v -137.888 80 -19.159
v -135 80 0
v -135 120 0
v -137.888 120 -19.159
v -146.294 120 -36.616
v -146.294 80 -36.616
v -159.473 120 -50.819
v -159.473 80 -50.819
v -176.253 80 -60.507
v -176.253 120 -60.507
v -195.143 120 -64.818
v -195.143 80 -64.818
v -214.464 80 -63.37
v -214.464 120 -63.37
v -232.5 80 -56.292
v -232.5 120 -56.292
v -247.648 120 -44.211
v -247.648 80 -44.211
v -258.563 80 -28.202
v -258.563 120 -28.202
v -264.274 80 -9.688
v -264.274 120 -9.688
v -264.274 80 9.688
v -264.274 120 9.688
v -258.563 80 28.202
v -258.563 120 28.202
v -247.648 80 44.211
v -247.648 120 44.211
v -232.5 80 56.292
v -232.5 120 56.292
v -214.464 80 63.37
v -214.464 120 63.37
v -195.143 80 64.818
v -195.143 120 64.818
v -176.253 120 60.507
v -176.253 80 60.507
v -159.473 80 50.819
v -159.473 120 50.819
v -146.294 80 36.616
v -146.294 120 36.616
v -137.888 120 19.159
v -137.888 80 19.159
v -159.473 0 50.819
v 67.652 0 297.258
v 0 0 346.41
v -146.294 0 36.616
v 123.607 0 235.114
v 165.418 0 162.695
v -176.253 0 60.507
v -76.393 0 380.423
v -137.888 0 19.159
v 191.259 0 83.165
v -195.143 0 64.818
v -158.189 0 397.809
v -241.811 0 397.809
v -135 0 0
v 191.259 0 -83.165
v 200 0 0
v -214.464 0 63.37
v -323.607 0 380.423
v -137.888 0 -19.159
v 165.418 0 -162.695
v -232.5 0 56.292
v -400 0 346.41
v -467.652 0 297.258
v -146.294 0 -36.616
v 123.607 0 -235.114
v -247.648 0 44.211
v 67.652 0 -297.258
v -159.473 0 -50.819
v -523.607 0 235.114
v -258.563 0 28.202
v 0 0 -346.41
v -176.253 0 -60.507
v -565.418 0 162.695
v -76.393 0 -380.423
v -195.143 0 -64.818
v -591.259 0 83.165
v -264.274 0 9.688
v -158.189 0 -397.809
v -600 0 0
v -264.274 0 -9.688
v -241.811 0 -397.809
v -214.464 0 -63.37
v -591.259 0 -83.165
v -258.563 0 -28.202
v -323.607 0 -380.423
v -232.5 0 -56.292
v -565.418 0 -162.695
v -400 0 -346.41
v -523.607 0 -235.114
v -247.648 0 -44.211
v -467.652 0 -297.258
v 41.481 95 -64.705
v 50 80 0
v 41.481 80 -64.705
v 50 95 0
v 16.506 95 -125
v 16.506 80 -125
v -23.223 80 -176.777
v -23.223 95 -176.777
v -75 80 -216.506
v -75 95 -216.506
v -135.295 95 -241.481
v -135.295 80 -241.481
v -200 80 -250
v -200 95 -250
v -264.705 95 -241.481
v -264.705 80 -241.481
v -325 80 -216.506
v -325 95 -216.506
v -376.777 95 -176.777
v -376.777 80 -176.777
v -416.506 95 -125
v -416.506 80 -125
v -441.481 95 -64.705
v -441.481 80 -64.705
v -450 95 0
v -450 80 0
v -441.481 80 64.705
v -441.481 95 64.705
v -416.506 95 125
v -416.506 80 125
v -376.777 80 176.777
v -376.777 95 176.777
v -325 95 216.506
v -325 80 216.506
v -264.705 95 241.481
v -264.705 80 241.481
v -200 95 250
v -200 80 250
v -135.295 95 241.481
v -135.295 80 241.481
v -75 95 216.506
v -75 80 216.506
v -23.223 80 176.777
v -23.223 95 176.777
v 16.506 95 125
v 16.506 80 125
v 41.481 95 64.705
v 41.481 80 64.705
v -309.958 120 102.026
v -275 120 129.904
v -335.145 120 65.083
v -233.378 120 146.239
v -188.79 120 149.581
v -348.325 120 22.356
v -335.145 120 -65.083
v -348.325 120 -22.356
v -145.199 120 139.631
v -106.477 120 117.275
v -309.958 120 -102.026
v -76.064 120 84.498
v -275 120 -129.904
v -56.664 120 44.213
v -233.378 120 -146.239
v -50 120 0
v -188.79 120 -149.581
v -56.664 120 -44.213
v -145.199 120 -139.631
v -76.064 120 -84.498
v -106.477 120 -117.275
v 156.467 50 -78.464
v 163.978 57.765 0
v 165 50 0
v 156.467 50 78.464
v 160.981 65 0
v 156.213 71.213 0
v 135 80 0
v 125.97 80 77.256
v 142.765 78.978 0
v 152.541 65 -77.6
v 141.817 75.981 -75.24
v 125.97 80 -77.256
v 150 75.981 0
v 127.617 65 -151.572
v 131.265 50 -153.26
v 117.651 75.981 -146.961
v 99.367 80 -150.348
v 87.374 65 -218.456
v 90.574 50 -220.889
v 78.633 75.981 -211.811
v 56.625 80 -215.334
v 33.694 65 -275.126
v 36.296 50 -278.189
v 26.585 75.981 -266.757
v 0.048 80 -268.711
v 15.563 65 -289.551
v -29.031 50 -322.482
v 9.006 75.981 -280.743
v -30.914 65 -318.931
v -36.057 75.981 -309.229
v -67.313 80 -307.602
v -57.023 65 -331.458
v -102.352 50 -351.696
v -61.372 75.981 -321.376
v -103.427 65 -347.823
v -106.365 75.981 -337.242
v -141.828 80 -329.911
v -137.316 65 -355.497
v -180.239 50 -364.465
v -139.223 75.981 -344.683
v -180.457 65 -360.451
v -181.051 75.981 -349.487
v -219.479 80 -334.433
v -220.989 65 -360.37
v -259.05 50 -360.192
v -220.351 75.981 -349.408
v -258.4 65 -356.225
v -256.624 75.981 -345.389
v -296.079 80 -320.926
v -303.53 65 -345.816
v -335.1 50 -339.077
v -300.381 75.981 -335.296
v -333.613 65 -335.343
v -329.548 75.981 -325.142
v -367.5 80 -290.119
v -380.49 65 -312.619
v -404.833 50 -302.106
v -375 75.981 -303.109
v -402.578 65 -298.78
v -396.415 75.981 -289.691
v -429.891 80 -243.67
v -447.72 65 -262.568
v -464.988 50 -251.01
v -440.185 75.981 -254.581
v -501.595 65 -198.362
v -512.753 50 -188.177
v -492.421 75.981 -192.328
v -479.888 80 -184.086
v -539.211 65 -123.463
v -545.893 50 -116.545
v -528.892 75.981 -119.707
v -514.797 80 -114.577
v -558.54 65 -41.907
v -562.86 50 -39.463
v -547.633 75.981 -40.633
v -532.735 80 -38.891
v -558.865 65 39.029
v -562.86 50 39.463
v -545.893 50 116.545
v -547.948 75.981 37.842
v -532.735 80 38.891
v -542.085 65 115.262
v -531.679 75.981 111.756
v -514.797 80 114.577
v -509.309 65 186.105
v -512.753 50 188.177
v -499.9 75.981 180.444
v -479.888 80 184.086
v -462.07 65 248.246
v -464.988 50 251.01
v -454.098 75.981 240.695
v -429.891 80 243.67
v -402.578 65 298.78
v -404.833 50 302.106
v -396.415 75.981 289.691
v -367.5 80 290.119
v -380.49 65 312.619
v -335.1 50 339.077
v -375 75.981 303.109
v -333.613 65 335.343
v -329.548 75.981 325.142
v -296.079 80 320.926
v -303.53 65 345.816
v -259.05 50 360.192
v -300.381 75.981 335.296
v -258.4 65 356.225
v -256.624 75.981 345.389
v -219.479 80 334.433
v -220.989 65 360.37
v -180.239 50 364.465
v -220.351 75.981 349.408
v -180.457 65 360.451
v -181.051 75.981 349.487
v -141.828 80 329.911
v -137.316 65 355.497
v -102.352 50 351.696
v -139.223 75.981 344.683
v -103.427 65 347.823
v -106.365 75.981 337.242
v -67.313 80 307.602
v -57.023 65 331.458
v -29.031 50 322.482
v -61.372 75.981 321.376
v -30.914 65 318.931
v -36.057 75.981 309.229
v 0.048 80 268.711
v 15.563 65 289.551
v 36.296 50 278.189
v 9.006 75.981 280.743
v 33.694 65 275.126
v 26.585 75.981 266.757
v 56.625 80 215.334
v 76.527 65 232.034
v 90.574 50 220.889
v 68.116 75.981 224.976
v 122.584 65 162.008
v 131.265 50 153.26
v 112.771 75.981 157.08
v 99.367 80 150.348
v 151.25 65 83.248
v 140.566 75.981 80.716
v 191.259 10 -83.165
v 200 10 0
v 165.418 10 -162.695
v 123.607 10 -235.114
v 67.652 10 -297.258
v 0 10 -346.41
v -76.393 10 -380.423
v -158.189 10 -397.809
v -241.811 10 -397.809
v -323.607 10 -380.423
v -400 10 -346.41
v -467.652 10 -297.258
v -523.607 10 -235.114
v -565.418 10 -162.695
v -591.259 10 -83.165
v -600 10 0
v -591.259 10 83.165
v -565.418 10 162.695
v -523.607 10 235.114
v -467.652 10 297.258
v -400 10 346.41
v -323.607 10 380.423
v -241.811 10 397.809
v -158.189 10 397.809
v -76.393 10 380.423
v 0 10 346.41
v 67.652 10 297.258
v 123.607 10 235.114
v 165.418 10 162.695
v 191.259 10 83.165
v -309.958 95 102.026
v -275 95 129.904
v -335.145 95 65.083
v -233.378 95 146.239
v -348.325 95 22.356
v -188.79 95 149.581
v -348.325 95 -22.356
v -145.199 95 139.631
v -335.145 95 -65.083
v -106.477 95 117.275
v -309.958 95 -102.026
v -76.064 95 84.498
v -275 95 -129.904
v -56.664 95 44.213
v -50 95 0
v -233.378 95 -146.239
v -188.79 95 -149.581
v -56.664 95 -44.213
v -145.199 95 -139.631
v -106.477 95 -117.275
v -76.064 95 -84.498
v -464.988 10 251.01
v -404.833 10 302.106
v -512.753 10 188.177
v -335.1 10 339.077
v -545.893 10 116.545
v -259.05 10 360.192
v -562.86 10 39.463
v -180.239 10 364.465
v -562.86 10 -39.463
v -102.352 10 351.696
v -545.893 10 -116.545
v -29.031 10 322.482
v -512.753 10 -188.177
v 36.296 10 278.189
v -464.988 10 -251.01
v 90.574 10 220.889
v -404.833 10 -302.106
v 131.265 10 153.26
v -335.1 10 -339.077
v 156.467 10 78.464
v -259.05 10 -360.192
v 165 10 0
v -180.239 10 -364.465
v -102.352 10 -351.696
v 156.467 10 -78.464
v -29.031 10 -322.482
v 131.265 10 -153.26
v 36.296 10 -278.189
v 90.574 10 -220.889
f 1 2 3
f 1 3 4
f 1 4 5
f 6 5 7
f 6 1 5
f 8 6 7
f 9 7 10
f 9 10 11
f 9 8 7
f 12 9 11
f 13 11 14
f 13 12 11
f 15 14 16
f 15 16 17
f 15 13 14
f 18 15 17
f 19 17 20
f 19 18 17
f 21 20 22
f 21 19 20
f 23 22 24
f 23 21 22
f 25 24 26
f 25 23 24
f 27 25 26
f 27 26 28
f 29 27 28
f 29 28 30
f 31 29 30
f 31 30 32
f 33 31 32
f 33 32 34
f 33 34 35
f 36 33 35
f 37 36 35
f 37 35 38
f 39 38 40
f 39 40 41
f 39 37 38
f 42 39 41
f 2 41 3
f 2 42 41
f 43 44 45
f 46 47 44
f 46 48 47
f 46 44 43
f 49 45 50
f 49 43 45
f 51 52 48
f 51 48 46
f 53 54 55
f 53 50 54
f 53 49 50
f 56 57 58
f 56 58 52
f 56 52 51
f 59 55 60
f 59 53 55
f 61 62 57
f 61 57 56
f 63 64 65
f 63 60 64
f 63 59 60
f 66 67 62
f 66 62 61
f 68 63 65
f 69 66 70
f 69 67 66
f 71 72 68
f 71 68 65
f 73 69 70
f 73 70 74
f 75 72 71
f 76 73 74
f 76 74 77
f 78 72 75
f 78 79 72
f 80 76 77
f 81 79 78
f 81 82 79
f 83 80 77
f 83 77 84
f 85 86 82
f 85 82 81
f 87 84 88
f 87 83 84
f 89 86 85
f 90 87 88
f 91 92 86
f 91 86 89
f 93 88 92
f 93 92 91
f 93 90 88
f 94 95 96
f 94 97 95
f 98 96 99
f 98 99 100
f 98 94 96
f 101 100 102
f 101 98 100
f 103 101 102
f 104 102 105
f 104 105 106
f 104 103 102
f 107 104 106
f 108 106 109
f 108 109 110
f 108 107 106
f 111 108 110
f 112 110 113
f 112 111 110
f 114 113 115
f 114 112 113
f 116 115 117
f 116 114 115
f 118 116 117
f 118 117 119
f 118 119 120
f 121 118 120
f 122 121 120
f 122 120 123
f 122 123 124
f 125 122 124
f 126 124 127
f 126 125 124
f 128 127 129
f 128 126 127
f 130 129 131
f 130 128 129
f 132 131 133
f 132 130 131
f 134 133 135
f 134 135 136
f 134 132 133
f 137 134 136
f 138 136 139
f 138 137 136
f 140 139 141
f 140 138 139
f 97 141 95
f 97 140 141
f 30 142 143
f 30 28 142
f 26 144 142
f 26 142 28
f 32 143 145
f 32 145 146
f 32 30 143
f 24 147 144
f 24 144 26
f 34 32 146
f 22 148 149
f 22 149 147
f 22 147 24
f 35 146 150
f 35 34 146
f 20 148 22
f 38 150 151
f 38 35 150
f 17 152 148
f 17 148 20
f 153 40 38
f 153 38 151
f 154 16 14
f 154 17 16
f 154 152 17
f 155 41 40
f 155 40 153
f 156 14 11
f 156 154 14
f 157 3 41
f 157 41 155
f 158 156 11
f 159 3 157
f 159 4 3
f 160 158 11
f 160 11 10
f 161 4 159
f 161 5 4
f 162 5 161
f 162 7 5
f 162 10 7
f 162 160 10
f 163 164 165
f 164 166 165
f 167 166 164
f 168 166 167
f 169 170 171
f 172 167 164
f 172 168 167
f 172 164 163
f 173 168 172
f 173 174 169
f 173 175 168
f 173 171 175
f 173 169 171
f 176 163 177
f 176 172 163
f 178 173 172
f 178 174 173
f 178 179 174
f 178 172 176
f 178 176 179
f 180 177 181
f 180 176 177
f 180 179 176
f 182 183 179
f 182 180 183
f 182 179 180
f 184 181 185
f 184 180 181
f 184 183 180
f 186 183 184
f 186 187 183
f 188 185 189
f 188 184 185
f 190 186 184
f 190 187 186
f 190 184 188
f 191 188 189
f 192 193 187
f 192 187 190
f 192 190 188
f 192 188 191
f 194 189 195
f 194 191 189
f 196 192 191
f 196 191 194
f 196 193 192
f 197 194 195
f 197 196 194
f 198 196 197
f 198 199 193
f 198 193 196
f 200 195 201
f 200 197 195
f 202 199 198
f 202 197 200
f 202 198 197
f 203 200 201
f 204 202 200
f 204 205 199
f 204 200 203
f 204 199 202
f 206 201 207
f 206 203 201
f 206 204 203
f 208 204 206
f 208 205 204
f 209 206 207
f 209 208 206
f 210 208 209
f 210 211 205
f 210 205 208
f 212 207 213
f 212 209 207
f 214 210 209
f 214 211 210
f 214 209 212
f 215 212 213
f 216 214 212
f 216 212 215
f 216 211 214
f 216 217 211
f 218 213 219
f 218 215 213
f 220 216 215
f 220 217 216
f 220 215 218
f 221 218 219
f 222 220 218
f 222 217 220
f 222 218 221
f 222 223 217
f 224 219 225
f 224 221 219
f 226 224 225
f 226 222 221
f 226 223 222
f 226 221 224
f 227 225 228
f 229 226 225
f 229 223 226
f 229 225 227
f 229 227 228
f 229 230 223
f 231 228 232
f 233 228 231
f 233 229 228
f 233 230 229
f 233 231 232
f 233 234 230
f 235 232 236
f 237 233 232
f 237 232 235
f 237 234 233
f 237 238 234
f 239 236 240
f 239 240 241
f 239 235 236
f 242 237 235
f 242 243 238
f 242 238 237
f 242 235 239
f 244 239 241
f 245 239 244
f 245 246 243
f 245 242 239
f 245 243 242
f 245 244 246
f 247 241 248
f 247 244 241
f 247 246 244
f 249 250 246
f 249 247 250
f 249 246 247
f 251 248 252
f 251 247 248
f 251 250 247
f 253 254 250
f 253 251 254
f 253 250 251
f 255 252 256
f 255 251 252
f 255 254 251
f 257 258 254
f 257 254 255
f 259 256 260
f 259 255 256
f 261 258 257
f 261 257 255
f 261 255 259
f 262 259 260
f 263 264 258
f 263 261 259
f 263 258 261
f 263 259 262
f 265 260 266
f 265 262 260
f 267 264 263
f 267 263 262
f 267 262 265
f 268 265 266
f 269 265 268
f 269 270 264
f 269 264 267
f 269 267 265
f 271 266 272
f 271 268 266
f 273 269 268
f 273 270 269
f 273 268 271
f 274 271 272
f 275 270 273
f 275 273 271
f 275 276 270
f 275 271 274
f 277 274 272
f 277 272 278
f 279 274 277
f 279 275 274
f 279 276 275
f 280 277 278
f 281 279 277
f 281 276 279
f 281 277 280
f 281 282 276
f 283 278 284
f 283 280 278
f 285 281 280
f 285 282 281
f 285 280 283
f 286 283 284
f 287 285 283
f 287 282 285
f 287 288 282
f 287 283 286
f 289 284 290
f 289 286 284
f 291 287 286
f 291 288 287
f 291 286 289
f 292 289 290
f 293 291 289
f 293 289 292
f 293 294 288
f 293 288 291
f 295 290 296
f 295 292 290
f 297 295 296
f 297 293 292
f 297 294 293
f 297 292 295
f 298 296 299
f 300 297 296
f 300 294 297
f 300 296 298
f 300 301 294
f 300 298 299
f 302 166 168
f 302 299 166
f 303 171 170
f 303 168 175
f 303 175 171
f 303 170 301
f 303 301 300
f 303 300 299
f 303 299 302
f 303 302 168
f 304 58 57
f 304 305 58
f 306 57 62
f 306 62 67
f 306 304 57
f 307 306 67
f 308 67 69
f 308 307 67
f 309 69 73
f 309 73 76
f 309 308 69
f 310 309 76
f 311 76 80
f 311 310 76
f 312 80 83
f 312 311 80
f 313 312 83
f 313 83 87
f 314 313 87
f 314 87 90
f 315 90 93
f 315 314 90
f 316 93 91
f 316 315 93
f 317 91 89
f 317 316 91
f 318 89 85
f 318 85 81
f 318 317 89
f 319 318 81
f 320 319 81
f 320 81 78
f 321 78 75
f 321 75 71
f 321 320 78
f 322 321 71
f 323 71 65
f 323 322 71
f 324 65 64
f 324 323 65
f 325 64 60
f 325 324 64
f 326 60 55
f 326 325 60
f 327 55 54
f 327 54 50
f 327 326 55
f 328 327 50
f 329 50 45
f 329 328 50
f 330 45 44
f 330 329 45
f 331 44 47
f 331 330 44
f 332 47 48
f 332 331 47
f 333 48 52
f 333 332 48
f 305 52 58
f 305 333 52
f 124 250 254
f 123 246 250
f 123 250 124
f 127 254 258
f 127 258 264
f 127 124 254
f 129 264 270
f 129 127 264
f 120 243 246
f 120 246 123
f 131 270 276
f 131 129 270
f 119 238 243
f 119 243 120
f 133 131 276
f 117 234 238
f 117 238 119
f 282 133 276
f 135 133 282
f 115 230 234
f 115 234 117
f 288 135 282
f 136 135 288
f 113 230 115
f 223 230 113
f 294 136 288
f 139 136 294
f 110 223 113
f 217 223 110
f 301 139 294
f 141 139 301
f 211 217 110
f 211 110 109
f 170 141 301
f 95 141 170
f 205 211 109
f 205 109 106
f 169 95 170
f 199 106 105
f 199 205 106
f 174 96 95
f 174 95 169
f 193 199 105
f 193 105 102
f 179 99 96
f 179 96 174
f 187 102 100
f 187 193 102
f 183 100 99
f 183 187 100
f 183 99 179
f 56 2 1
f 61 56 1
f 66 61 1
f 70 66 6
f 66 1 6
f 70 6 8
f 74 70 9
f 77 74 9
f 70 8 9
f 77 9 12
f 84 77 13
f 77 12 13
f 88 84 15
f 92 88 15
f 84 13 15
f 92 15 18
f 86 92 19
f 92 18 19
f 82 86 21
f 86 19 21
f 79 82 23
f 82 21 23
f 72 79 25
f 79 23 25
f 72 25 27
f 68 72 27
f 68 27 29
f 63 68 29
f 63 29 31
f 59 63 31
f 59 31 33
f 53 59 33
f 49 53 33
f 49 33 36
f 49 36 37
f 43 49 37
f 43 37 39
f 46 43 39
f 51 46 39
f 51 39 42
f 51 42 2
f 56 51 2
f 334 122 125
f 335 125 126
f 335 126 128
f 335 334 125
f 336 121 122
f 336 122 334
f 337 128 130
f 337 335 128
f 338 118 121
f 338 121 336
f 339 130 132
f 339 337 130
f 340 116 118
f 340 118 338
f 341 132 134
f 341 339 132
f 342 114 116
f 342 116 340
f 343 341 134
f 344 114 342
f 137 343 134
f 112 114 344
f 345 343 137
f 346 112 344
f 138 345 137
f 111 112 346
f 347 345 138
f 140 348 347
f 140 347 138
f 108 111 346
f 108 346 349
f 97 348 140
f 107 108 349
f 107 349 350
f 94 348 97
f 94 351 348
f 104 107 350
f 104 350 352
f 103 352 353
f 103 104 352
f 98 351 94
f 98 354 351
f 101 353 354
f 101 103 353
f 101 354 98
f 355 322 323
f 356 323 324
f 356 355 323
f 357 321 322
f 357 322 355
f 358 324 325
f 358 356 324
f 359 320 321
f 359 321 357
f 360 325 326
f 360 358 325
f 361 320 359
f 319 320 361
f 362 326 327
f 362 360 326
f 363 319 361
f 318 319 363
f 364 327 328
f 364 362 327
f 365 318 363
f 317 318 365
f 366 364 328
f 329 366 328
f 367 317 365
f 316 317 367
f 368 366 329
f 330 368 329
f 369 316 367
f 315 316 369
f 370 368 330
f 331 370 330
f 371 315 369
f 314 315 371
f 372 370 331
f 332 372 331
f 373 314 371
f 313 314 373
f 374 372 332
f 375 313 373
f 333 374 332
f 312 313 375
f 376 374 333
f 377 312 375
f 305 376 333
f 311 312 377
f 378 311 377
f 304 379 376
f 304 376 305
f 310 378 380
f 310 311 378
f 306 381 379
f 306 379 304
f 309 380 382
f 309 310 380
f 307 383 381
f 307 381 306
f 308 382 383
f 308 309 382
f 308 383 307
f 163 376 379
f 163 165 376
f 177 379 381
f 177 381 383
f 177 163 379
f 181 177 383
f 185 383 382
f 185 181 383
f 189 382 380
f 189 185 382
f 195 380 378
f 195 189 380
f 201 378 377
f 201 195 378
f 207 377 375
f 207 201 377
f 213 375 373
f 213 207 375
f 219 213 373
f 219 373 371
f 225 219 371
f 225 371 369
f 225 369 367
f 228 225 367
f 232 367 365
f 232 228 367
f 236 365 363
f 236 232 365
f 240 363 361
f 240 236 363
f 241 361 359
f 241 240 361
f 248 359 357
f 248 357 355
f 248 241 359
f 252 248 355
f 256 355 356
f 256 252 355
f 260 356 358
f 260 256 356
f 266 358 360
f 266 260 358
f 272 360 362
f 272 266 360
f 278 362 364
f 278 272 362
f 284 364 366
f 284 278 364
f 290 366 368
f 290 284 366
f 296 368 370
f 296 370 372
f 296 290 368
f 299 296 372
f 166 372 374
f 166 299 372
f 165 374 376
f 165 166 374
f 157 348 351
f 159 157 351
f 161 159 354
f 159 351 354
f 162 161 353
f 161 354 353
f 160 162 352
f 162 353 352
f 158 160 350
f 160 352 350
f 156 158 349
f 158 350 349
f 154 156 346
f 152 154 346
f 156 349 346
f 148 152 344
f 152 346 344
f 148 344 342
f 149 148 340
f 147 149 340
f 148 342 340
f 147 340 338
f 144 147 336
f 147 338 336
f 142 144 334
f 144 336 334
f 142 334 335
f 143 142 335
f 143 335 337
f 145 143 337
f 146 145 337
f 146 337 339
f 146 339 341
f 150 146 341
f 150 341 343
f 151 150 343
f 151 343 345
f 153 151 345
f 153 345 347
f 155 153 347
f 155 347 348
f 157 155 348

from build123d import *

# Parameters (mm, degrees)
SKETCH4_R           = 150
SKETCH4_R_2         = 65
BOSS_EXTRUDE3_DEPTH = 40
SKETCH5_R           = 50
CUT_EXTRUDE1_DEPTH  = 11
SKETCH6_R           = 65
CUT_EXTRUDE2_DEPTH  = 121


with BuildPart() as part:
    # Sketch1 → Revolve2 (revolve)
    with BuildSketch(Plane.XY):
        with BuildLine():
            Line((-200, 10), (-200, 0))
            Line((-200, 0), (200, 0))
            Line((200, 0), (200, 10))
            Line((200, 10), (165, 10))
            Line((165, 10), (165, 50))
            ThreePointArc((165, 50), (156.213203436, 71.213203436), (135, 80))
            Line((135, 80), (50, 80))
            Line((50, 80), (50, 95))
            Line((50, 95), (-50, 95))
            Line((-50, 95), (-50, 80))
            Line((-50, 80), (-135, 80))
            ThreePointArc((-135, 80), (-156.213203436, 71.213203436), (-165, 50))
            Line((-165, 50), (-165, 10))
            Line((-165, 10), (-200, 10))
        make_face()
    revolve(axis=Axis((-200, -16.726974685, 0), (0, 1, 0)))

    # Sketch4 → Boss-Extrude3 (add)
    with BuildSketch(Plane(origin=(0, 80, 0), x_dir=(1, 0, 0), z_dir=(0, 1, 0))):
        with Locations((-200, 0)):
            Circle(SKETCH4_R)
        with Locations((-200, 0)):
            Circle(SKETCH4_R_2, mode=Mode.SUBTRACT)
    extrude(amount=BOSS_EXTRUDE3_DEPTH)

    # Sketch5 → Cut-Extrude1 (cut, through all)
    with BuildSketch(Plane(origin=(0, 10, 0), x_dir=(1, 0, 0), z_dir=(0, 1, 0))):
        with Locations((-200, 0)):
            Circle(SKETCH5_R)
    extrude(amount=-CUT_EXTRUDE1_DEPTH, mode=Mode.SUBTRACT)

    # Sketch6 → Cut-Extrude2 (cut, through all)
    with BuildSketch(Plane(origin=(0, 120, 0), x_dir=(1, 0, 0), z_dir=(0, 1, 0))):
        with Locations((-200, 0)):
            Circle(SKETCH6_R)
    extrude(amount=-CUT_EXTRUDE2_DEPTH, mode=Mode.SUBTRACT)


solid = part.part
